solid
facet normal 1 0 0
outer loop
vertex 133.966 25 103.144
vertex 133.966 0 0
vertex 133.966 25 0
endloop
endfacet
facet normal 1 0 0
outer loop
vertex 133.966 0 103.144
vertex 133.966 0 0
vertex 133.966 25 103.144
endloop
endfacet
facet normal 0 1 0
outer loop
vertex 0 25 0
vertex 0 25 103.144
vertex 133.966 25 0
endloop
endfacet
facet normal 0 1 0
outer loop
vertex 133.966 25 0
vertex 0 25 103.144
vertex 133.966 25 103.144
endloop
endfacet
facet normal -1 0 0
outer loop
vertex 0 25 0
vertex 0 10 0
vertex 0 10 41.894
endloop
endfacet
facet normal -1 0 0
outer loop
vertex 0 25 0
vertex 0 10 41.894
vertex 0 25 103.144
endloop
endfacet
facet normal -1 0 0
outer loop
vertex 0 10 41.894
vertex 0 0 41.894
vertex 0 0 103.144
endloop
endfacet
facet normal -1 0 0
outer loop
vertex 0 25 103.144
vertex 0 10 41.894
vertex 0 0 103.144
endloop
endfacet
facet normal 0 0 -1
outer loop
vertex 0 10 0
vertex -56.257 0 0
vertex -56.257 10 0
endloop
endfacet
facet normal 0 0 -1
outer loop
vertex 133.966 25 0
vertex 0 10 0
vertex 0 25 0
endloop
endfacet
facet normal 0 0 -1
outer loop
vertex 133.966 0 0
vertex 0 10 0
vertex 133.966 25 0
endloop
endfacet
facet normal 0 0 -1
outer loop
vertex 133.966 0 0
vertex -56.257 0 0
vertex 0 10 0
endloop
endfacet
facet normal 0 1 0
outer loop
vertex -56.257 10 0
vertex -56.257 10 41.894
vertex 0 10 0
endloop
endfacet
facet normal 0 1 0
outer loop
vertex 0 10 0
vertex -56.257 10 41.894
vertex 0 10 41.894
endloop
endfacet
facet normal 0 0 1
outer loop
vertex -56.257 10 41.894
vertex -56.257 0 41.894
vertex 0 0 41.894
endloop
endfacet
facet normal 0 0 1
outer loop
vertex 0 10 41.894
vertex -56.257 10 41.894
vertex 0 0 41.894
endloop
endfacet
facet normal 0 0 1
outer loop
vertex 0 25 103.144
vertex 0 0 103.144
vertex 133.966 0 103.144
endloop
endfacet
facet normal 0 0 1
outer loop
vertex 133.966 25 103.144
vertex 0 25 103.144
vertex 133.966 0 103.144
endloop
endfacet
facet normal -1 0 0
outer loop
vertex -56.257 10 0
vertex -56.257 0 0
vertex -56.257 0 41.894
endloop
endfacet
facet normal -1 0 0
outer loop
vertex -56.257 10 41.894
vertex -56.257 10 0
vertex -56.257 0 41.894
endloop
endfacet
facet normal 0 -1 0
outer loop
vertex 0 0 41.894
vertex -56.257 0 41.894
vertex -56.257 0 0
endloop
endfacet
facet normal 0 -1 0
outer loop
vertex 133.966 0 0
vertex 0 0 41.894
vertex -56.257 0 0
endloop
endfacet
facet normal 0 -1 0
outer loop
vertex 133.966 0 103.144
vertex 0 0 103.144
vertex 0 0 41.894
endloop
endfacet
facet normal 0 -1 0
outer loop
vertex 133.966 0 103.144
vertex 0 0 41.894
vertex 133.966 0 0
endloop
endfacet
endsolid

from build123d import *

# Parameters (mm, degrees)
F0_W     = 133.965507
F0_H     = 103.144266
F1_DEPTH = 25
F2_W     = 56.256611
F2_H     = 41.894164
F3_DEPTH = 10


with BuildPart() as f1:
    # F0 (on Front) → F1 (new body)
    with BuildSketch(Plane.XZ):
        with Locations((66.982754, 51.572133)):
            Rectangle(F0_W, F0_H)
    extrude(amount=-F1_DEPTH)

    # F2 (on Front) → F3 (join)
    with BuildSketch(Plane.XZ):
        with Locations((-28.128305, 20.947082)):
            Rectangle(F2_W, F2_H)
    extrude(amount=-F3_DEPTH)


solid = f1.part
